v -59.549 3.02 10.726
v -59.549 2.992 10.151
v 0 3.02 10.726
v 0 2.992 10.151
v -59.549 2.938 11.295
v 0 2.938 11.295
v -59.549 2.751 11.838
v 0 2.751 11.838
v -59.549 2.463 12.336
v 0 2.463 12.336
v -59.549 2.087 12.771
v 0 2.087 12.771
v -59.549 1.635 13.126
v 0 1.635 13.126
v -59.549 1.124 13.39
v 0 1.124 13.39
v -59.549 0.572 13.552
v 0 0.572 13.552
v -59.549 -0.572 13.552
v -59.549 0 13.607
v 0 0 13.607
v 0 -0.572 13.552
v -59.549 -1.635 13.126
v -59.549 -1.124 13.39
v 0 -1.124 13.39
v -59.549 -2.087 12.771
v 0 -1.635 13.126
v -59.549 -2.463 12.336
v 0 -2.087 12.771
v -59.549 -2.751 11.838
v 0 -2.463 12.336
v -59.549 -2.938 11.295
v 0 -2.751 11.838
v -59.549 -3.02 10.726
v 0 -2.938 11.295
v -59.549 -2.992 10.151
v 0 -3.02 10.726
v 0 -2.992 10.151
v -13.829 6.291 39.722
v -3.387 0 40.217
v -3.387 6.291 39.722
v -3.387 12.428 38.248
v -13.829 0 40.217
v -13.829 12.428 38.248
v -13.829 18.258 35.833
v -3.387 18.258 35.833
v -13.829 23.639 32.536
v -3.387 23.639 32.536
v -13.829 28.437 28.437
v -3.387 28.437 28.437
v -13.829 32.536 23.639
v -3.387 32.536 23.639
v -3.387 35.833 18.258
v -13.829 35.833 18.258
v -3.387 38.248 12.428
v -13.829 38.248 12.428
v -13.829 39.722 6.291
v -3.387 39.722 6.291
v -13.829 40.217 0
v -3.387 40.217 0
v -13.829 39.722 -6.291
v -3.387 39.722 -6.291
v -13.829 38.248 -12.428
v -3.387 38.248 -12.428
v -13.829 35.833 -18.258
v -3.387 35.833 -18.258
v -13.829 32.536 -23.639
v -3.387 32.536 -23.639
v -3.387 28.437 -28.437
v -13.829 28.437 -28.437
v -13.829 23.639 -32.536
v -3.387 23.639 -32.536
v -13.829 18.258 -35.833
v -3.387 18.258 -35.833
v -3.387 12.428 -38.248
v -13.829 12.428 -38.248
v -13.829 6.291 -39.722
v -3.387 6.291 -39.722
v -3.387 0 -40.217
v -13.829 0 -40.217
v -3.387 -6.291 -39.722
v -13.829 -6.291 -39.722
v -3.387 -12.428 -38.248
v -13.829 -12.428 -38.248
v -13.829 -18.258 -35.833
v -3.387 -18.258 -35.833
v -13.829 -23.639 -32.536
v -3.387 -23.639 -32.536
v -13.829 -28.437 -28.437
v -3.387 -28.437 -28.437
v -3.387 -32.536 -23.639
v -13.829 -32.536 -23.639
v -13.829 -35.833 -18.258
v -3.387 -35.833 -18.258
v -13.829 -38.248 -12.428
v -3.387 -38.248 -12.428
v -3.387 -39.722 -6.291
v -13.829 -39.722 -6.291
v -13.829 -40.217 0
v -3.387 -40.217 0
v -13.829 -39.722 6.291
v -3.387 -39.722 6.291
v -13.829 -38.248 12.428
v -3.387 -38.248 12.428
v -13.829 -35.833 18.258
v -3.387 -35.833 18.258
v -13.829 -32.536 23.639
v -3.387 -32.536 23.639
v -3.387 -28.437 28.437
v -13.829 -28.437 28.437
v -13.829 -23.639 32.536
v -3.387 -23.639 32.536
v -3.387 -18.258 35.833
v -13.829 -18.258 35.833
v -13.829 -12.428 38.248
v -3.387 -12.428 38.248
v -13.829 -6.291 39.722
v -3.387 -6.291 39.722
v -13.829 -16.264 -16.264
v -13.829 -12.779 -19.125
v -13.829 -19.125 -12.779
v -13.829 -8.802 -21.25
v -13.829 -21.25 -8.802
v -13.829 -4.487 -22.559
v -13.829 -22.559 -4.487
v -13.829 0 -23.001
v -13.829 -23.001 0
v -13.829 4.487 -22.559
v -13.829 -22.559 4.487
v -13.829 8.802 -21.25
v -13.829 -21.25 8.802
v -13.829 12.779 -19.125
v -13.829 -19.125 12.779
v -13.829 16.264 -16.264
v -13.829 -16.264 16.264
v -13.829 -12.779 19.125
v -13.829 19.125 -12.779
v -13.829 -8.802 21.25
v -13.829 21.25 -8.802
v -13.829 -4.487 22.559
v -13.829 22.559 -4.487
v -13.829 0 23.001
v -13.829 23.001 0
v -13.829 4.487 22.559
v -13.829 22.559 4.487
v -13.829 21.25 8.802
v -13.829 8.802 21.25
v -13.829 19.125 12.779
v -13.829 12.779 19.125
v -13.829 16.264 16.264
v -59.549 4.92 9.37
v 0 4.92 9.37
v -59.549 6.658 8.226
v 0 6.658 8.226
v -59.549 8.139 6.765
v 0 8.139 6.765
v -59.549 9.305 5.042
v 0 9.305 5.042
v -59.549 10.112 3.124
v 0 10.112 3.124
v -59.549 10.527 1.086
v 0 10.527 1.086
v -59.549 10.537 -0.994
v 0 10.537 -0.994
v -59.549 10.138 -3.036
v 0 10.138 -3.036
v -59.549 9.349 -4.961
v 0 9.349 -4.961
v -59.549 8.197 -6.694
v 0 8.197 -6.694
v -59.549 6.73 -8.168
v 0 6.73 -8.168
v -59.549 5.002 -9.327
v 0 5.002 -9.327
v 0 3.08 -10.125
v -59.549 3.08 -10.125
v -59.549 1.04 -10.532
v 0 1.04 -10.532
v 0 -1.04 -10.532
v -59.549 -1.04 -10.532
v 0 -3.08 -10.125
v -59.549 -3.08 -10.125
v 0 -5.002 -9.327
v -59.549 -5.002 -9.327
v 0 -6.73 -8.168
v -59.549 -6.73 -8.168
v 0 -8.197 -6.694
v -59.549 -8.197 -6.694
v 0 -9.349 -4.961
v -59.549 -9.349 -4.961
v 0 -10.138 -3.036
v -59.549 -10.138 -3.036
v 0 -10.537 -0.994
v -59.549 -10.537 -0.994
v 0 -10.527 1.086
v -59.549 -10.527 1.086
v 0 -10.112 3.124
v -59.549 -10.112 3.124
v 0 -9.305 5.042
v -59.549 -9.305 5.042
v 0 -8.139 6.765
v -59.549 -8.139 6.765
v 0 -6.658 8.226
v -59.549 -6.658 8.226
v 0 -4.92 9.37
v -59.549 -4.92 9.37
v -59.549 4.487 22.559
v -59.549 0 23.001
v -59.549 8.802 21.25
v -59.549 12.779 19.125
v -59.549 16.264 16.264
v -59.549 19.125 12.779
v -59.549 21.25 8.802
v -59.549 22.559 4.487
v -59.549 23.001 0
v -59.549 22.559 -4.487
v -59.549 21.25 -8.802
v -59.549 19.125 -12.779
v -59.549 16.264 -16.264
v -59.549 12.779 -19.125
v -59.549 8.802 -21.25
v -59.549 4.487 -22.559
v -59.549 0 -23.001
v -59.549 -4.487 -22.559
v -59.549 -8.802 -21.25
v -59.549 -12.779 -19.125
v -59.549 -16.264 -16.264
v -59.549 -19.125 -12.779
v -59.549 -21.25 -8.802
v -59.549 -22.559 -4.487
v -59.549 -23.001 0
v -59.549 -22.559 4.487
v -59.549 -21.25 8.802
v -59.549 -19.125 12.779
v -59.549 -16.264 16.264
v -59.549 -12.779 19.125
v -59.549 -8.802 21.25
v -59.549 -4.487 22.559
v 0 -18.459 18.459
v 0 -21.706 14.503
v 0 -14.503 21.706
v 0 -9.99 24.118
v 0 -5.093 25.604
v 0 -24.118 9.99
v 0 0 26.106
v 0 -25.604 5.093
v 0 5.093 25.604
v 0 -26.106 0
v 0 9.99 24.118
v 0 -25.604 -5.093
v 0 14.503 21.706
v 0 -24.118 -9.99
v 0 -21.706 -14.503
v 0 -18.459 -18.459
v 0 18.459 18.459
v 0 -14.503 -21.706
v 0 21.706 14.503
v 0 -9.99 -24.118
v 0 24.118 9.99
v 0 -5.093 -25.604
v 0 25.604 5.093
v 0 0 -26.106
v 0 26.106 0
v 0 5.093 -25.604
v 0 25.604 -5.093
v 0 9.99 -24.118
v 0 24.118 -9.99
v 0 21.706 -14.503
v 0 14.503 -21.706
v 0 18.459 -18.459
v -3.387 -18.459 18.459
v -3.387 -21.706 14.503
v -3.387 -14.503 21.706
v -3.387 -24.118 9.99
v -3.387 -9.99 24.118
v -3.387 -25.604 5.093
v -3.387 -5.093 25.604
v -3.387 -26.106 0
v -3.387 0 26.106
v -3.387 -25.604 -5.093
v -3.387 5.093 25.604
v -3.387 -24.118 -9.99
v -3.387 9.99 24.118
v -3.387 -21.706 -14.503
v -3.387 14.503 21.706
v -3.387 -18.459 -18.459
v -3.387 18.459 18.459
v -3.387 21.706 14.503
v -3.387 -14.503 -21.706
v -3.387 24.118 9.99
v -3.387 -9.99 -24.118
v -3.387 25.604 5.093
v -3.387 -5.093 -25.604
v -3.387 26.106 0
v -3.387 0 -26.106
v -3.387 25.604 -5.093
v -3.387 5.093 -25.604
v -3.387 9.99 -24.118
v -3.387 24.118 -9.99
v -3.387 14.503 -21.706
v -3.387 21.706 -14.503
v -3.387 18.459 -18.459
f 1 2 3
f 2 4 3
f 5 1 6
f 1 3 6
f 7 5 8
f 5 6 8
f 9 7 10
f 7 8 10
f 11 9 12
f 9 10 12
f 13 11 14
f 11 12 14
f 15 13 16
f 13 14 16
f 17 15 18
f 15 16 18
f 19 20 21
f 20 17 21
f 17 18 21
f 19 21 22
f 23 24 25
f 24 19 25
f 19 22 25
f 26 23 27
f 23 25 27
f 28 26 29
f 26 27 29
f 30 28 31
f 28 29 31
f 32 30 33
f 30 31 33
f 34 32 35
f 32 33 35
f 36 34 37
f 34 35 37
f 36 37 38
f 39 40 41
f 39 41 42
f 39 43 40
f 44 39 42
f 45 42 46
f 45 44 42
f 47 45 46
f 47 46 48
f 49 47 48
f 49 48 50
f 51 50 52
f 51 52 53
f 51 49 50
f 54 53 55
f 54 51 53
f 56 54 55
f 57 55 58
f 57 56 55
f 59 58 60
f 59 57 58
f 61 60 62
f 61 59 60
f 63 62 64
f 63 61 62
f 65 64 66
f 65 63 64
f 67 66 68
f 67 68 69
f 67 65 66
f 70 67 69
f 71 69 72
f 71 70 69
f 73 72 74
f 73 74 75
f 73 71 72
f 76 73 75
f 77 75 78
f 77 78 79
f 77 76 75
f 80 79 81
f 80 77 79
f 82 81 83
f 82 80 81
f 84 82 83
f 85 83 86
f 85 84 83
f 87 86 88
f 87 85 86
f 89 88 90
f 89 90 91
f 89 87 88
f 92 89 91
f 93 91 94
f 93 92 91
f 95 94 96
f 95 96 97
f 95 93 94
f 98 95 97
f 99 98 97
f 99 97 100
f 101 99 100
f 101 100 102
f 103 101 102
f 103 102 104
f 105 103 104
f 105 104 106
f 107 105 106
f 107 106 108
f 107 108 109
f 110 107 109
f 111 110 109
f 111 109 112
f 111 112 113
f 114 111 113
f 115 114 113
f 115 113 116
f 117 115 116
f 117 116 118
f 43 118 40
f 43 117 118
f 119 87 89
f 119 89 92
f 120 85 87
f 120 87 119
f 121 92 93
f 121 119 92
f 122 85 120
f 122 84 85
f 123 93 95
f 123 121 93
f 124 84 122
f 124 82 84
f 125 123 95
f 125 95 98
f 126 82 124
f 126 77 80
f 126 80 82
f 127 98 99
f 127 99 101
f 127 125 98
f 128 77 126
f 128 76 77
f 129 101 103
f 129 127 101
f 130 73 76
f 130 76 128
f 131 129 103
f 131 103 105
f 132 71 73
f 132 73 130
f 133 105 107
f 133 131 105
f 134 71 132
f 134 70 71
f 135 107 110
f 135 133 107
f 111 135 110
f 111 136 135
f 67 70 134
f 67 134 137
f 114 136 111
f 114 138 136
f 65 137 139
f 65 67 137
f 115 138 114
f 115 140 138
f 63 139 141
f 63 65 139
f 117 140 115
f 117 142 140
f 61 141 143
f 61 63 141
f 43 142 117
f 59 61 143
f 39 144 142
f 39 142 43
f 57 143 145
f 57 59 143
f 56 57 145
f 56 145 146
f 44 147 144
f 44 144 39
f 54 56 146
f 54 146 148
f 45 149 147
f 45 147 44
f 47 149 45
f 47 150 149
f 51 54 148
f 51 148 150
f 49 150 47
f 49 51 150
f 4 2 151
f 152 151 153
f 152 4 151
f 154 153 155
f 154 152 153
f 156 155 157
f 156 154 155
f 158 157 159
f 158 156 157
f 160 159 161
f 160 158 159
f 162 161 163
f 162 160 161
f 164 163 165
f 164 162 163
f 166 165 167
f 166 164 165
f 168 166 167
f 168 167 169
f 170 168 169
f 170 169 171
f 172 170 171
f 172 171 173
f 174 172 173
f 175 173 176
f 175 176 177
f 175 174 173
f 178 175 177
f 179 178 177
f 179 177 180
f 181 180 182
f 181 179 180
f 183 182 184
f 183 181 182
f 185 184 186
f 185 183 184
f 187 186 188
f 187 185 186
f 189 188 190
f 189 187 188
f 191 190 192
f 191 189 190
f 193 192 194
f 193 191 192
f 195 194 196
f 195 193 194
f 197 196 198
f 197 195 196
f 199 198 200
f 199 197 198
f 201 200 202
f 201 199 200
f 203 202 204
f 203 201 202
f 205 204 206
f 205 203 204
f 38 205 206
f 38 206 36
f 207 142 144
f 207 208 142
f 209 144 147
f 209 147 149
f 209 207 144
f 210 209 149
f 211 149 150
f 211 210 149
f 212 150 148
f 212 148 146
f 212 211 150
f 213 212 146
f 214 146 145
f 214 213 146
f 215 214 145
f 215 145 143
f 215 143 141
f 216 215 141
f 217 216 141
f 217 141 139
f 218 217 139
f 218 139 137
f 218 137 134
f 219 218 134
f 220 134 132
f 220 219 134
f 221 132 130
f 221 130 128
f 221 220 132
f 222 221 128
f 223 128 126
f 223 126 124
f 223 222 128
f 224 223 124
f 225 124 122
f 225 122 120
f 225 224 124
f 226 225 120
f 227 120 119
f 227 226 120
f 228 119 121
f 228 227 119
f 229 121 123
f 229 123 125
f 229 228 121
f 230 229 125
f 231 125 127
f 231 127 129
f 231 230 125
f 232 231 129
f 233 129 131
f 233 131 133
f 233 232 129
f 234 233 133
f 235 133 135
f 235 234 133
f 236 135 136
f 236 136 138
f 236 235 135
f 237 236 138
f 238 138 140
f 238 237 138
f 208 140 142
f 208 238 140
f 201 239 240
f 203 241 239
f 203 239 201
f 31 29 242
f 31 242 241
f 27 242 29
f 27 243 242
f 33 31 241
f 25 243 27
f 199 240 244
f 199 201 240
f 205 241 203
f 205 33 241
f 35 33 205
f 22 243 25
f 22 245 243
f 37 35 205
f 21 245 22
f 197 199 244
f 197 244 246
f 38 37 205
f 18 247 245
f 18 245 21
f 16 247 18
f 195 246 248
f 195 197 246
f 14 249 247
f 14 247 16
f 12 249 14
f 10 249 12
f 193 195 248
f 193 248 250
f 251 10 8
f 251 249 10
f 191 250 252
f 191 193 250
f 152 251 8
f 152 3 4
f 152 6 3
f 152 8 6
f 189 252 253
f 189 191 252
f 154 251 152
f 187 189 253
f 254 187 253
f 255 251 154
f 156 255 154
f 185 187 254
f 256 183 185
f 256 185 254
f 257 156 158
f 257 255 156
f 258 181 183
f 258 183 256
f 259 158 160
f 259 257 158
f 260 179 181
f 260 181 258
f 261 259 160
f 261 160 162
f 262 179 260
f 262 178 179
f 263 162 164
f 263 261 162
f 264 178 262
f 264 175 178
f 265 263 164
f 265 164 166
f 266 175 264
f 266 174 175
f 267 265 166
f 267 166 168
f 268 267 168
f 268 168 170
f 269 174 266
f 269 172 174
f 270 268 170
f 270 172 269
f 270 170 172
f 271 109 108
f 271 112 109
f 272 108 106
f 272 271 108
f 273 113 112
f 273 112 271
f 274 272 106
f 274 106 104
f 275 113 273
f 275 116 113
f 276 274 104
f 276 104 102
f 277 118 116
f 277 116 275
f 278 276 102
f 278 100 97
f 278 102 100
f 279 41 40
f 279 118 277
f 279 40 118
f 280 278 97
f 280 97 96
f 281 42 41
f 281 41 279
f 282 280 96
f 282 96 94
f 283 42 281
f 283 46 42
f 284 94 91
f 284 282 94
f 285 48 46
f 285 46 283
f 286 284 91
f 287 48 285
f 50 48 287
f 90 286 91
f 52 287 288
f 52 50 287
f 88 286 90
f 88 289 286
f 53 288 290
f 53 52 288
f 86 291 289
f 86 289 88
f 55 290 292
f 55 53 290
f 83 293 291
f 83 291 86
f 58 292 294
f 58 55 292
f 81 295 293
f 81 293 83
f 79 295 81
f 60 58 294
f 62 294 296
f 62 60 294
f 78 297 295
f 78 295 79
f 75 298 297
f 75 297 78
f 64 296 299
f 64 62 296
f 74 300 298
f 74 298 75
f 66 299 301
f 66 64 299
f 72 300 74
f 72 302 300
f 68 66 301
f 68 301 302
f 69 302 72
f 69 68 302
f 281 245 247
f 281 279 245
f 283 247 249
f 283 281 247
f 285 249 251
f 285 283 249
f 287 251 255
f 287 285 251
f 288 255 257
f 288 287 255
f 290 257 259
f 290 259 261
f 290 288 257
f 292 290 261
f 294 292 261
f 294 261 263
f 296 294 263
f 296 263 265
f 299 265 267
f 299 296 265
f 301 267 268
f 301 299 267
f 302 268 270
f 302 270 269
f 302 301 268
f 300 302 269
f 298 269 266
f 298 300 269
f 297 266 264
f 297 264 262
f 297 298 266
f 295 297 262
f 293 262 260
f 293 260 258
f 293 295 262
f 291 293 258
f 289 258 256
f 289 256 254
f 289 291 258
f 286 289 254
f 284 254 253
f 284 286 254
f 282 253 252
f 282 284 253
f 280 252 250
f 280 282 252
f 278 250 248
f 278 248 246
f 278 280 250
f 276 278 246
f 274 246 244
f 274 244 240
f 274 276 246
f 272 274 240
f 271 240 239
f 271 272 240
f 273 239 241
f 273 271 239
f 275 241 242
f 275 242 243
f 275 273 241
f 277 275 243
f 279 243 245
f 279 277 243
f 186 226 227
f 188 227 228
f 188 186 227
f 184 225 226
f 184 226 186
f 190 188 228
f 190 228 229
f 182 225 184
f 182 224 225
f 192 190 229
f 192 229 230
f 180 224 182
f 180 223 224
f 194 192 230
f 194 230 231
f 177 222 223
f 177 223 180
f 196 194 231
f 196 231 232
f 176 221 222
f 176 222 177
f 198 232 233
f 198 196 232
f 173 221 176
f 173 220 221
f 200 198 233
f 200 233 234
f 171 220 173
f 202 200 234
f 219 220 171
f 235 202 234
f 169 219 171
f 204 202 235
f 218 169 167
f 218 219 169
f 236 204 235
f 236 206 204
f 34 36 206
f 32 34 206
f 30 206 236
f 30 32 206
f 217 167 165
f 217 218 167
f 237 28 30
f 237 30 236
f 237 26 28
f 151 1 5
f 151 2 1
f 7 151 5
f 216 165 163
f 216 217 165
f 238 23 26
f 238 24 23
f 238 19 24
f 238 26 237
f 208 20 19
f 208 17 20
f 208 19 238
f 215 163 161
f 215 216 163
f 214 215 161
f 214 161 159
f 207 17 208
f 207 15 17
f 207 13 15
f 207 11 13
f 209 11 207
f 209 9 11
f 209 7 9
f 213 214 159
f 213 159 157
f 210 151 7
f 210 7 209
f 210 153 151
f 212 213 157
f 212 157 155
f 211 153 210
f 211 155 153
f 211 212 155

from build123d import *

# Parameters (mm, degrees)
F2_R     = 3.02334
F3_DEPTH = 59.549888


with BuildPart() as f1:
    # F0 (on Front) → F1 (revolve)
    with BuildSketch(Plane.XZ):
        Polygon((-59.548888, 10.583334), (0, 10.583334), (0, 26.105555), (-3.386669, 26.105555), (-3.386669, 40.216666), (-13.828888, 40.216666), (-13.828888, 23.00111), (-59.548888, 23.00111), align=None)
    revolve(axis=Axis((-68.222322, 0, 0), (-1, 0, 0)))

    # F2 (on face) → F3 (cut, through all)
    with BuildSketch(Plane.YZ):
        with Locations((0, 10.583334)):
            Circle(F2_R)
    extrude(amount=-F3_DEPTH, mode=Mode.SUBTRACT)


solid = f1.part
